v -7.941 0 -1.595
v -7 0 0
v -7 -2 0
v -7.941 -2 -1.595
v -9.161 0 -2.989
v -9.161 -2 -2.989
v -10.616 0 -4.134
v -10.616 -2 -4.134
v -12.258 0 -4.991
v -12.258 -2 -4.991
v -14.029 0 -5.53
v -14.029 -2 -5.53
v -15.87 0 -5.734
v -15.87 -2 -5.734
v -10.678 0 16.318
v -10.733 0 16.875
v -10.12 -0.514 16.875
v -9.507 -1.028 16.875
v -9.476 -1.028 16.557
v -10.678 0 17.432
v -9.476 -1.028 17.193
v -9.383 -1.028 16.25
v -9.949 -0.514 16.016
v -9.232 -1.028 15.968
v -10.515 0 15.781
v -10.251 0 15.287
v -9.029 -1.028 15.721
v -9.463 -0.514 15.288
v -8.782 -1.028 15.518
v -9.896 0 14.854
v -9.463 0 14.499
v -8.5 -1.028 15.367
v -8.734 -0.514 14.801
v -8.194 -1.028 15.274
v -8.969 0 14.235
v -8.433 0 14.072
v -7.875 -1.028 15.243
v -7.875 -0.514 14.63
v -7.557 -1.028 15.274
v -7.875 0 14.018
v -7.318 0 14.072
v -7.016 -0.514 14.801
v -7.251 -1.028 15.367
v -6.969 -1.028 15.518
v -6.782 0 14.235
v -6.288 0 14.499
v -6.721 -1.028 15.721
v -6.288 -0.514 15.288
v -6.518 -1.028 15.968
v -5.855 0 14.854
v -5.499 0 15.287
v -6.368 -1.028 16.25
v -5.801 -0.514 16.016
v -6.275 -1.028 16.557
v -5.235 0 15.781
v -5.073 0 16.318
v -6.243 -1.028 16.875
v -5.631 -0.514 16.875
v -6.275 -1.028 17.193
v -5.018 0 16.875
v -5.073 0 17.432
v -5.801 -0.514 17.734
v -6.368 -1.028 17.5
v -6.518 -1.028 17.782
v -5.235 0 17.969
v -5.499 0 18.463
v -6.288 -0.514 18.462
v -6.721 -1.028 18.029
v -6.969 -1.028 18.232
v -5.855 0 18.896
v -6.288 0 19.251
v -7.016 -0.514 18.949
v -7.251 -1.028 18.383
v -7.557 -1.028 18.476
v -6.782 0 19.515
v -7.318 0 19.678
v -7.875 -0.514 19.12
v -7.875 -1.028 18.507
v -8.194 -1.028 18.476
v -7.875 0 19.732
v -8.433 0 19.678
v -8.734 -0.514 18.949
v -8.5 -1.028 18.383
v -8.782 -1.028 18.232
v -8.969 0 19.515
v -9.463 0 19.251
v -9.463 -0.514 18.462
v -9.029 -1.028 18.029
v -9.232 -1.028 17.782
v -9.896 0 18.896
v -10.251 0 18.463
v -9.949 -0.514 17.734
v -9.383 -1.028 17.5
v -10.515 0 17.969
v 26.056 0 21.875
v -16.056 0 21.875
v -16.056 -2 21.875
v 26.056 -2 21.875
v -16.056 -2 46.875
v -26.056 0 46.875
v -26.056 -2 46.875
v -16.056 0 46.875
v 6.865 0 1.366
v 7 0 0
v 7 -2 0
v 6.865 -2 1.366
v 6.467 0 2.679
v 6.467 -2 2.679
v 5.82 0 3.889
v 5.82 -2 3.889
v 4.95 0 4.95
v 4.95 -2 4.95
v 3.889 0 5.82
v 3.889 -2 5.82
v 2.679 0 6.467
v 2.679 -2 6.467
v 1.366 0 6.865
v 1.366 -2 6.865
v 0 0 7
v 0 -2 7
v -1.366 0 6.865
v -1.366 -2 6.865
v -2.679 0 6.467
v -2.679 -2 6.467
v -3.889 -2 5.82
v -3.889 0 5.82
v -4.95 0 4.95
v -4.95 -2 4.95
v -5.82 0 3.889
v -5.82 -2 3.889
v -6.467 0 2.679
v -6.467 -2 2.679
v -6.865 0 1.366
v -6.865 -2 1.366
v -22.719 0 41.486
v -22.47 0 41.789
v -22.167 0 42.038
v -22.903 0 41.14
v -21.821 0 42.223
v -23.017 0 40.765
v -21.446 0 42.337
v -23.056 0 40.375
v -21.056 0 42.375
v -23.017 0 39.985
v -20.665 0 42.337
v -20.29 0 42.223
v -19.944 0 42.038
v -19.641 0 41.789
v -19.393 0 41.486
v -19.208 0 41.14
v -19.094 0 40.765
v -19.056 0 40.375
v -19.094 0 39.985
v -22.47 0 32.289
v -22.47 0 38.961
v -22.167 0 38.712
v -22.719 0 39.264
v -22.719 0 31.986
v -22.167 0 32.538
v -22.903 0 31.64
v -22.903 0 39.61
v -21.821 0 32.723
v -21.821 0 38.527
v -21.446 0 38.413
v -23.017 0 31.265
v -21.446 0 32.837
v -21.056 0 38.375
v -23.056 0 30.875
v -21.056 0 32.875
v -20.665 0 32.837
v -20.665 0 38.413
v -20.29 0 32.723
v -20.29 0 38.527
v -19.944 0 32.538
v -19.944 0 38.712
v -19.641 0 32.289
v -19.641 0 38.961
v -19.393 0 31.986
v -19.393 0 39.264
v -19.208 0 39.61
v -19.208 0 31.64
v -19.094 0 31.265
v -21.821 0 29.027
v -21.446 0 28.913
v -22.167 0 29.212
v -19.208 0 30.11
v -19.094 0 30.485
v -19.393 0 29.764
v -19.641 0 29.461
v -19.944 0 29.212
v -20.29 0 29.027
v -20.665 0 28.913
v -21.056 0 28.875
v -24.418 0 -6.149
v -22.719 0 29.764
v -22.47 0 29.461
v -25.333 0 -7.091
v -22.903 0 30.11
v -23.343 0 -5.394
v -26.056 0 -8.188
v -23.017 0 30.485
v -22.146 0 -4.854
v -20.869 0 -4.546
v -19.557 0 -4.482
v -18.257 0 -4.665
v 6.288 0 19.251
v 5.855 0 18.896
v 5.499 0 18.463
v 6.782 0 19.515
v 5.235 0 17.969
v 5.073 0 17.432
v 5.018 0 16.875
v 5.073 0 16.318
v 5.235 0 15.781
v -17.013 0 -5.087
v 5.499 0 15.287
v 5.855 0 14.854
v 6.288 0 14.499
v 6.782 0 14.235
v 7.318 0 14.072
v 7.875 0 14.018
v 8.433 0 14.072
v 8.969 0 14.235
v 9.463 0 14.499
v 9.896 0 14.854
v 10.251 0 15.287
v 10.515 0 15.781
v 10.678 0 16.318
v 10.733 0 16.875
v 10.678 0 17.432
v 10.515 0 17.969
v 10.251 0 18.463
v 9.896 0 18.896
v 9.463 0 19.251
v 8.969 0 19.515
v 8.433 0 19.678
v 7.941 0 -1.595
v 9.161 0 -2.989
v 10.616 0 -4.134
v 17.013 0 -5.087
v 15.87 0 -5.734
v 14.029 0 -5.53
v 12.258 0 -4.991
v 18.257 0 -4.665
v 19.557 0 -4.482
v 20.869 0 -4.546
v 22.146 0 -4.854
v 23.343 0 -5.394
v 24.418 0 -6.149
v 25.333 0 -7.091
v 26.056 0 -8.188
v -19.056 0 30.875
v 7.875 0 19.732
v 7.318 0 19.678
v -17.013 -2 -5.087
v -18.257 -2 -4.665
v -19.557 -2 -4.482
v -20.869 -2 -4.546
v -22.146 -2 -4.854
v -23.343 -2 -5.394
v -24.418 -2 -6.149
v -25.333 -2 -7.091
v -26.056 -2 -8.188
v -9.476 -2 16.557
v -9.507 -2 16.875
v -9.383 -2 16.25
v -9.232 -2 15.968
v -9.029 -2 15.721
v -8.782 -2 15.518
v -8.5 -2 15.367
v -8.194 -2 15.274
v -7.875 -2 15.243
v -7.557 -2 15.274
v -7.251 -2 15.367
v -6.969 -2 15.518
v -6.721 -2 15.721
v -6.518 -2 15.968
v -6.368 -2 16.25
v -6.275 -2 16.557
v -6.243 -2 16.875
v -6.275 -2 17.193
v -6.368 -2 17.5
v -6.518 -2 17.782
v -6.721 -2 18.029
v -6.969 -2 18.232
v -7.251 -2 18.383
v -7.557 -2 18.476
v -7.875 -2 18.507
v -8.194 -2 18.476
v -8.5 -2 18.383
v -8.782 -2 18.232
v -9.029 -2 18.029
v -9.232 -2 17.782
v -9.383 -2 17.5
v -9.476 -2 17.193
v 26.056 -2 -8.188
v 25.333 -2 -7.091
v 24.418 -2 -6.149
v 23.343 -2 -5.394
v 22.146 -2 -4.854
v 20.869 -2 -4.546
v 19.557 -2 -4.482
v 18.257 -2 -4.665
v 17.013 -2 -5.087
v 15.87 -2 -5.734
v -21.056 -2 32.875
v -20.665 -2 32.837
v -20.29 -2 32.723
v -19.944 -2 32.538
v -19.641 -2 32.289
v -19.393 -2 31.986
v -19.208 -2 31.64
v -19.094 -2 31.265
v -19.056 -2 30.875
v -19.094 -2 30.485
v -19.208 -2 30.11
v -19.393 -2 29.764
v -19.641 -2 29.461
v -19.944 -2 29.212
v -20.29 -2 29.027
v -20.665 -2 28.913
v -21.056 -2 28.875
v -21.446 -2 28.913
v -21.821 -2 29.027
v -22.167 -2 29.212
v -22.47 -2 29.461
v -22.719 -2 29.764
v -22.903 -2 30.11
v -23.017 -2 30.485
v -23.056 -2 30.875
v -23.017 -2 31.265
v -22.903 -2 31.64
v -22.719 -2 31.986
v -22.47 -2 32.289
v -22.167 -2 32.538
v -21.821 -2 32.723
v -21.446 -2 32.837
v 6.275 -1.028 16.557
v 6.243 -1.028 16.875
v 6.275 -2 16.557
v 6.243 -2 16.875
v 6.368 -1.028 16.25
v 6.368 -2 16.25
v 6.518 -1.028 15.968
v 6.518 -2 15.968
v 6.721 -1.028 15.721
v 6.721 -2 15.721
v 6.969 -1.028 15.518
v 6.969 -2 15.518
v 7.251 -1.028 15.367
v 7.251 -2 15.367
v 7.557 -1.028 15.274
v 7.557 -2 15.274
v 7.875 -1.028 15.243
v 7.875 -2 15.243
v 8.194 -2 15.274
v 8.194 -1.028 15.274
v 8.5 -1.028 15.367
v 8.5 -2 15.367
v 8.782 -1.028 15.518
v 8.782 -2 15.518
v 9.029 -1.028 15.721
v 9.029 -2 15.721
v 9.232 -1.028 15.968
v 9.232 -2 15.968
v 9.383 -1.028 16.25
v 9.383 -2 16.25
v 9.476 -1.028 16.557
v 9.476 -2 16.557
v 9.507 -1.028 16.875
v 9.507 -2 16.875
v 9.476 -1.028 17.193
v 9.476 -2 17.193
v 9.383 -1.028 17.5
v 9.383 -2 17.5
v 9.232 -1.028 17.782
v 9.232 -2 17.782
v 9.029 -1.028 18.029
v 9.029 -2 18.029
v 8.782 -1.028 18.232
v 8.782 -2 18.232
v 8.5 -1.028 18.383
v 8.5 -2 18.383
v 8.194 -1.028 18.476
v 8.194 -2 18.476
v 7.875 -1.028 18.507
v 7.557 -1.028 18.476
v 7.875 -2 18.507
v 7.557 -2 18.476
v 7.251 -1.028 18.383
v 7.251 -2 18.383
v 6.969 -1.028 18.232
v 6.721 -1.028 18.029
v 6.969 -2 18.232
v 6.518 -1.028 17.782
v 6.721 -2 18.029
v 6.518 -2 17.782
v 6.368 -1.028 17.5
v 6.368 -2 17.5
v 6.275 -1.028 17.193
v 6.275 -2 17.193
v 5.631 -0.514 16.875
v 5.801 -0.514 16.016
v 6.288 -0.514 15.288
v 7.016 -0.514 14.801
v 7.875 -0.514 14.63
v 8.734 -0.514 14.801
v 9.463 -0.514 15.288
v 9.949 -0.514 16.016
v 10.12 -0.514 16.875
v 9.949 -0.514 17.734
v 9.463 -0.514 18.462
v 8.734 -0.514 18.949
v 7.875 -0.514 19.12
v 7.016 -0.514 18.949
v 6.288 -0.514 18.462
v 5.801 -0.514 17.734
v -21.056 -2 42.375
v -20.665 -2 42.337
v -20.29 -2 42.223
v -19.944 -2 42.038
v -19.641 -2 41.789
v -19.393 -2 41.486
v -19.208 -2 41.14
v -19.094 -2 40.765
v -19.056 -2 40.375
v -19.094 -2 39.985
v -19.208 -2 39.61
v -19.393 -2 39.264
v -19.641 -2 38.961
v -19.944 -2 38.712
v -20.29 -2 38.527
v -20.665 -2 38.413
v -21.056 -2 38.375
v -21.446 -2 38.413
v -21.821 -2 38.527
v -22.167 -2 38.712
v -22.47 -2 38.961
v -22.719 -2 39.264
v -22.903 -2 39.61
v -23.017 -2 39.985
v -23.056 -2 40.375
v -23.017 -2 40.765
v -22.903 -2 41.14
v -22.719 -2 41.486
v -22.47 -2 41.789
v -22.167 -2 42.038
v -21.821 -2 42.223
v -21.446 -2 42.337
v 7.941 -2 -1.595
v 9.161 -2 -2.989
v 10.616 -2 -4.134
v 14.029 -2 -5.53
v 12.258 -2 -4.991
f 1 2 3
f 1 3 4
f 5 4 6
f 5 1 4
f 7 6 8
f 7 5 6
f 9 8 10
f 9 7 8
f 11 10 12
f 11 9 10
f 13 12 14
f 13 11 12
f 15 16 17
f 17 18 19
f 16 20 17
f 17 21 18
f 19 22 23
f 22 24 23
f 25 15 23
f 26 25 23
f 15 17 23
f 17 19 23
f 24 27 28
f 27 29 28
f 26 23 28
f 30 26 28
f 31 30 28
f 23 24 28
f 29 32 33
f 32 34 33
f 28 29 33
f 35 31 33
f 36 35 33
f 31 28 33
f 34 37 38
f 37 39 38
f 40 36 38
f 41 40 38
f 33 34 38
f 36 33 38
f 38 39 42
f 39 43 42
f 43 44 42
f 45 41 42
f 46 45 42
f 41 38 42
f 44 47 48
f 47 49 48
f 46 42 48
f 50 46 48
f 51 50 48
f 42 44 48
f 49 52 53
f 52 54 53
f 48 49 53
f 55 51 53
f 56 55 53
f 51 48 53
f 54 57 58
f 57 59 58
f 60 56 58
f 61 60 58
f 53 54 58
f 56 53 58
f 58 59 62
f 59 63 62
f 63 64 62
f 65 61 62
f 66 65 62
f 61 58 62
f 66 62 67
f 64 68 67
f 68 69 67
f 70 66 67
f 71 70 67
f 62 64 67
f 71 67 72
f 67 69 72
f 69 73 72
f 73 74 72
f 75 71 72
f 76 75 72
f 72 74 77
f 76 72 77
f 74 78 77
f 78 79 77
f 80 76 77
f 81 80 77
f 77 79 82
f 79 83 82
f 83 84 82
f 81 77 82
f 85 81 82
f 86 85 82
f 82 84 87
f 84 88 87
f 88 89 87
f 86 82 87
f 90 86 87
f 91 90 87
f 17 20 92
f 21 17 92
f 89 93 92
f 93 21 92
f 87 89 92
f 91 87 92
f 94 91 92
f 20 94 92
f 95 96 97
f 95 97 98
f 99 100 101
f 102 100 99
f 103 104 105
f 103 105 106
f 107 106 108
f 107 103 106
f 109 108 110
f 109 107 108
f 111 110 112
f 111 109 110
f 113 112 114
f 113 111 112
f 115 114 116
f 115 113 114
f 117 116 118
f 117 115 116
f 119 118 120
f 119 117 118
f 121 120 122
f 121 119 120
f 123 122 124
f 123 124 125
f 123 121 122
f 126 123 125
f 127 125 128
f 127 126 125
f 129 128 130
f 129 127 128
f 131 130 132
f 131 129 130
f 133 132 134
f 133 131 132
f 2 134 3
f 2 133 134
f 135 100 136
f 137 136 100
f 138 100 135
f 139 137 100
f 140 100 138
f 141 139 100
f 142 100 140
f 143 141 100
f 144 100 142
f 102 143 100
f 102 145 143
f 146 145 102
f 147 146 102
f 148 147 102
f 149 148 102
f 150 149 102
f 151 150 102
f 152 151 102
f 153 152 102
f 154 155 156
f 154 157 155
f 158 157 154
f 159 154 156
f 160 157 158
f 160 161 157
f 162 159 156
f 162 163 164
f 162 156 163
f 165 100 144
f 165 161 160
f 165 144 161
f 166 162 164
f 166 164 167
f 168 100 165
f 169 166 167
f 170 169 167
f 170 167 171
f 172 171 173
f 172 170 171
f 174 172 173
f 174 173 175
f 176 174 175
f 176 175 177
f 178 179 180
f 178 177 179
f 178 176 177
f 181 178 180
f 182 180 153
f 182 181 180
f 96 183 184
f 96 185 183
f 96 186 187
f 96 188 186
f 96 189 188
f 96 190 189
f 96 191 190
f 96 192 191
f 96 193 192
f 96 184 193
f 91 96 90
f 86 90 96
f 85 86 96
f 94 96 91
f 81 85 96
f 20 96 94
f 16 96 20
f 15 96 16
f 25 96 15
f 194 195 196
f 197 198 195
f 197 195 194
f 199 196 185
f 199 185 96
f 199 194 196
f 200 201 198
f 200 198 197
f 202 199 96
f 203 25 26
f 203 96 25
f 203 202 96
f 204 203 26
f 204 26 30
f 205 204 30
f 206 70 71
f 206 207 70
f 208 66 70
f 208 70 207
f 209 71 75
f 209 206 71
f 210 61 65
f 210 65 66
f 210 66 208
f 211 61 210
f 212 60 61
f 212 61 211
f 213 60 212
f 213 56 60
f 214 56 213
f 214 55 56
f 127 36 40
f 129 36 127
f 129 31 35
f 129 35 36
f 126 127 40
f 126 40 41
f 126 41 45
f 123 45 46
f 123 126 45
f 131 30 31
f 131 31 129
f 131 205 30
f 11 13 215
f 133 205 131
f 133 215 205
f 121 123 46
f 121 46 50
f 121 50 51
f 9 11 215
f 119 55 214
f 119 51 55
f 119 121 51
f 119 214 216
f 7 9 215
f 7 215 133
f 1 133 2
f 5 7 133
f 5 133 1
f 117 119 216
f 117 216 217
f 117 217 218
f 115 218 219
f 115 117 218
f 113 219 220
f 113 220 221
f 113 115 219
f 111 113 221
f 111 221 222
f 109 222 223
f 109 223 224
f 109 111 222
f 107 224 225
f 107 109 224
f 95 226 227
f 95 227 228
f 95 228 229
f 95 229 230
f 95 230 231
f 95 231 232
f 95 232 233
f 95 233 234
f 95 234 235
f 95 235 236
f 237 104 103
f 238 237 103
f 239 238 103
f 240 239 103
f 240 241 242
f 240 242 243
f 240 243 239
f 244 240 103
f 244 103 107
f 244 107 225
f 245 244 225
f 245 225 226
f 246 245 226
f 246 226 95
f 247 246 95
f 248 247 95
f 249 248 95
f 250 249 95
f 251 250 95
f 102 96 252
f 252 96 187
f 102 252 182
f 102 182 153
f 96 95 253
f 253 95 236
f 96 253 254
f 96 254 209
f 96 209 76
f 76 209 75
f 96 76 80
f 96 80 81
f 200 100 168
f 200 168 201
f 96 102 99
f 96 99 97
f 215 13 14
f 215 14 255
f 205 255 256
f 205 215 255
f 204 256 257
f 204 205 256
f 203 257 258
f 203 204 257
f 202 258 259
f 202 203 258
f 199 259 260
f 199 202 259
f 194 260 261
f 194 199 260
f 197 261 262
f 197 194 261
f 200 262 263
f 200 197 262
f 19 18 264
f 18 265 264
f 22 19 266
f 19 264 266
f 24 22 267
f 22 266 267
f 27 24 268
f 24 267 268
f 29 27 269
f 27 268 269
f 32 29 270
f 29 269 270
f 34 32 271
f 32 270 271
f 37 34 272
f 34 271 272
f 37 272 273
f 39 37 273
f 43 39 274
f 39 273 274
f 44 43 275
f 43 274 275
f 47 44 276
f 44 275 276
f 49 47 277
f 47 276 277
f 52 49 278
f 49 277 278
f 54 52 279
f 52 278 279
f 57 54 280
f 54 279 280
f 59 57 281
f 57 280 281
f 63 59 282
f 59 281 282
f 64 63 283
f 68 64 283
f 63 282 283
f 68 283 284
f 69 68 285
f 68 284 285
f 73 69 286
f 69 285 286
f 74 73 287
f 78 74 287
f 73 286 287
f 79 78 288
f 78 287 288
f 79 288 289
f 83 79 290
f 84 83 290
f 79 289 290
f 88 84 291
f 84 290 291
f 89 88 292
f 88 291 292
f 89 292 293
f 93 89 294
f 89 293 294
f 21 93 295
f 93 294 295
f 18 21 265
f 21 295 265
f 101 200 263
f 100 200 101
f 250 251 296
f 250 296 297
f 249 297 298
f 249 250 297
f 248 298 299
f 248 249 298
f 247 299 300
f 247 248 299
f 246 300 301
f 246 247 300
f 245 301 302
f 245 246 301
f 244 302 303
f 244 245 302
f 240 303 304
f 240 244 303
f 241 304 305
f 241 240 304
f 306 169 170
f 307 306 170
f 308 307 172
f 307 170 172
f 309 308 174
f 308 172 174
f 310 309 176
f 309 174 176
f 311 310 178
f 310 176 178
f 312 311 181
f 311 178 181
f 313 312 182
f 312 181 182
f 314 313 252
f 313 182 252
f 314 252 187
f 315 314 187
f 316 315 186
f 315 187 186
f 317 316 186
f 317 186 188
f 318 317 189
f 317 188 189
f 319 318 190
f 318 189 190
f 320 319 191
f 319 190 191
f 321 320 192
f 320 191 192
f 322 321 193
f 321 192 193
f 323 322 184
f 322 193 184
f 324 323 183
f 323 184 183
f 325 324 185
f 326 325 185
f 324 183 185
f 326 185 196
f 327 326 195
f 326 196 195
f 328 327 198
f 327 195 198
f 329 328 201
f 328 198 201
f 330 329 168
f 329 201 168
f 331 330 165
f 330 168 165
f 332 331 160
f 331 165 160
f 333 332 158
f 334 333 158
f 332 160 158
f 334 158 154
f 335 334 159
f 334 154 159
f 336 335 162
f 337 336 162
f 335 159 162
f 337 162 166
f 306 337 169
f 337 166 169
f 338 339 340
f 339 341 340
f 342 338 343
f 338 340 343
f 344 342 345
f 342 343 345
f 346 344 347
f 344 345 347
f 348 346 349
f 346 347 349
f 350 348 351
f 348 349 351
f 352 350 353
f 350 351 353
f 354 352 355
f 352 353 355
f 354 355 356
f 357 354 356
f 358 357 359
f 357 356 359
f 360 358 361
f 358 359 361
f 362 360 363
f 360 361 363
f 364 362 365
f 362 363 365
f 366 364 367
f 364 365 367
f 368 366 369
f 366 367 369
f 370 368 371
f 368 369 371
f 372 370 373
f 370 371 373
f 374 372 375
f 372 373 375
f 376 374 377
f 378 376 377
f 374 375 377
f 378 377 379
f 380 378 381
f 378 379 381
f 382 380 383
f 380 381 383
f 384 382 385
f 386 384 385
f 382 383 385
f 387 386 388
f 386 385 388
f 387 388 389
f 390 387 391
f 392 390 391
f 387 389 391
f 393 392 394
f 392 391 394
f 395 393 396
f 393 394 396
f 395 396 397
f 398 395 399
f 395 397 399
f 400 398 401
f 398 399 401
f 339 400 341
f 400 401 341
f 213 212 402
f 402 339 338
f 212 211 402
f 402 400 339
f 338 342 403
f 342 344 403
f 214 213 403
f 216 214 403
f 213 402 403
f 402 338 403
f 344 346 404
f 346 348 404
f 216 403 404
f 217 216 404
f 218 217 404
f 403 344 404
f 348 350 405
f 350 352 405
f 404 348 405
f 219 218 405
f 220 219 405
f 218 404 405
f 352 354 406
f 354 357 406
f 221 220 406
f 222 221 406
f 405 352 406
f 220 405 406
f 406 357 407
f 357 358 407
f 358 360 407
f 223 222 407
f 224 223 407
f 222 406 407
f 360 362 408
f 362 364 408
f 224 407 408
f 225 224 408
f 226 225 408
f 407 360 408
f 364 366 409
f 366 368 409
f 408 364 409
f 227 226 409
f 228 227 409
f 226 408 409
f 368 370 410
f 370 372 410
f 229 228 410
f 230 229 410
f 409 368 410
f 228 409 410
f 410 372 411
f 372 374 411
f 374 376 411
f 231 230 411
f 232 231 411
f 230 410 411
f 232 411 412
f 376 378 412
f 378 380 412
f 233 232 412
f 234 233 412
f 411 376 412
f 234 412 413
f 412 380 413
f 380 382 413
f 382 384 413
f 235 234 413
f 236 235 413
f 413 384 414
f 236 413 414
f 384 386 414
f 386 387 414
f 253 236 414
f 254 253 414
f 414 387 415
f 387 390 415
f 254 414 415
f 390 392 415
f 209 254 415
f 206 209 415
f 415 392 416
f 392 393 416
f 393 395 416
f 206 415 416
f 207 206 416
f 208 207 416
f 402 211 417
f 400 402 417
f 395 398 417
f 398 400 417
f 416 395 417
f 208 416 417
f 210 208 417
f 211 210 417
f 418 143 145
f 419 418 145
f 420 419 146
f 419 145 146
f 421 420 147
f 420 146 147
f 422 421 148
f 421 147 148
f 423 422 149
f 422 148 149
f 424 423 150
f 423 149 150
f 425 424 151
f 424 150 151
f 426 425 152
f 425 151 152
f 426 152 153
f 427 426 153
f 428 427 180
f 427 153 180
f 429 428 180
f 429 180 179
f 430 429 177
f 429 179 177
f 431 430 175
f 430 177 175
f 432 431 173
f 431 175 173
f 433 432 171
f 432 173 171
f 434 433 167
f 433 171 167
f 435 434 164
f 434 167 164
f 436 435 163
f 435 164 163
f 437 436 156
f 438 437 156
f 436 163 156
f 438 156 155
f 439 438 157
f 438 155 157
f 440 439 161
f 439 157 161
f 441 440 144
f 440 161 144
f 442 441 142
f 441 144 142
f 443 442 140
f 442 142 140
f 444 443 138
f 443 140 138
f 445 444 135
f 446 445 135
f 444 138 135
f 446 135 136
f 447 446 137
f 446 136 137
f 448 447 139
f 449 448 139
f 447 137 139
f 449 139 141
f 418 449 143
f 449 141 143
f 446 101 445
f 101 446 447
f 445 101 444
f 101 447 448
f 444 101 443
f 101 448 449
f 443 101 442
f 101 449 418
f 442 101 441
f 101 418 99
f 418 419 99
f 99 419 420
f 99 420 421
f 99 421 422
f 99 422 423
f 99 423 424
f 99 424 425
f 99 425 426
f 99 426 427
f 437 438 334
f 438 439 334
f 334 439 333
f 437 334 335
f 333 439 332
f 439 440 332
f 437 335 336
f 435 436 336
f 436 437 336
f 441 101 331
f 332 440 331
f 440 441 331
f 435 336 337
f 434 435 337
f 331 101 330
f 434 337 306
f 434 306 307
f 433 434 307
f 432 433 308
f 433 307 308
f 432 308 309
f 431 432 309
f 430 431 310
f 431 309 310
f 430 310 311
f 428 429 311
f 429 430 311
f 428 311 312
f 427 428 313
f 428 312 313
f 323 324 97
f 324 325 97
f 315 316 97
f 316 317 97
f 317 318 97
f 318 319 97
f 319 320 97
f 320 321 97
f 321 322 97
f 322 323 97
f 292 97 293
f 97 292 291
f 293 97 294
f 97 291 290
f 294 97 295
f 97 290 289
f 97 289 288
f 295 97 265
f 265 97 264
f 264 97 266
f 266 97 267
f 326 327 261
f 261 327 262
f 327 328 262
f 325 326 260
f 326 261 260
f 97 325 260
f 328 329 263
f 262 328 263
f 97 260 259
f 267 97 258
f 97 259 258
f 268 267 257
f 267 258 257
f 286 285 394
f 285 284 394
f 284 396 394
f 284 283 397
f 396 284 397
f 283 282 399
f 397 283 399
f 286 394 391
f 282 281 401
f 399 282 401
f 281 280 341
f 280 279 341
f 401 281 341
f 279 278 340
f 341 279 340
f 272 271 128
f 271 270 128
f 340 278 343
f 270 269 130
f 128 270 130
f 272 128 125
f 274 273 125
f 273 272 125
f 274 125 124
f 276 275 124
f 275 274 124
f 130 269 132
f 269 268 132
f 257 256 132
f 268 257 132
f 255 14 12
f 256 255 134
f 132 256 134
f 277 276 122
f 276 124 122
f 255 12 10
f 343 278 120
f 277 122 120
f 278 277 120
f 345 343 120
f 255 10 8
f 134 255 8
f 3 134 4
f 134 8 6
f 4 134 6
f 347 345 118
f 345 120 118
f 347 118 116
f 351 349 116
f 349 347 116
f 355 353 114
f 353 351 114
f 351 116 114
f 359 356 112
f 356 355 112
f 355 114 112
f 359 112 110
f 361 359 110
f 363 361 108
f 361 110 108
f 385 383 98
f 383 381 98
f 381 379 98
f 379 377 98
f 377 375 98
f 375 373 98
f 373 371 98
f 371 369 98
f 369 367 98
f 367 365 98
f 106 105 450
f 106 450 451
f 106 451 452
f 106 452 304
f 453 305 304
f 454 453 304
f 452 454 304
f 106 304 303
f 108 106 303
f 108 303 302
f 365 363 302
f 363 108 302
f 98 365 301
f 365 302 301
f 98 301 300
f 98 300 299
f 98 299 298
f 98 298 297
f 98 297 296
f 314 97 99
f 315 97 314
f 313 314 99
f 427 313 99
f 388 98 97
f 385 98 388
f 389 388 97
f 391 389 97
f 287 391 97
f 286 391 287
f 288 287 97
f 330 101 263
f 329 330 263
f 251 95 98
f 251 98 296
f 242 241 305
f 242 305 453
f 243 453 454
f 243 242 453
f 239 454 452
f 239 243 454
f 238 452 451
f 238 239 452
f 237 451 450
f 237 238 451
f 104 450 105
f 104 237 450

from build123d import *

# Parameters (mm, degrees)
BASE_FLANGE1_DEPTH                                = 2
SKETCH7_R                                         = 2
CUT_EXTRUDE1_DEPTH                                = 2
CSK_FOR_4_FLAT_HEAD_MACHINE_SCREW_100_D           = 3.2639
CSK_FOR_4_FLAT_HEAD_MACHINE_SCREW_100_DEPTH       = 2
CSK_FOR_4_FLAT_HEAD_MACHINE_SCREW_100_CSINK_D     = 5.715
CSK_FOR_4_FLAT_HEAD_MACHINE_SCREW_100_CSINK_ANGLE = 100
CSK_FOR_4_FLAT_HEAD_MACHINE_SCREW_100_TIP         = 0.980574487


# Sheet-metal steps are written as plain solids
with BuildPart() as part:
    # Sketch2 → Base-Flange1 (new body)
    with BuildSketch(Plane(origin=(0, 0, 0), x_dir=(1, 0, 0), z_dir=(0, 1, 0))):
        with BuildLine():
            Line((-26.055569119, -21.875), (-26.055569119, -46.875))
            Line((-26.055569119, -46.875), (-16.055569119, -46.875))
            Line((-16.055569119, -46.875), (-16.055569119, -21.875))
            Line((-16.055569119, -21.875), (26.055569119, -21.875))
            Line((26.055569119, -21.875), (26.055569119, 8.188046441))
            ThreePointArc((26.055569119, 8.188046441), (21.514872246, 4.669726518), (15.870079226, 5.73406431))
            ThreePointArc((15.870079226, 5.73406431), (10.616247764, 4.133629141), (7, 0))
            ThreePointArc((7, 0), (0, -7), (-7, 0))
            ThreePointArc((-7, 0), (-10.616247764, 4.133629141), (-15.870079226, 5.73406431))
            ThreePointArc((-15.870079226, 5.73406431), (-21.514872246, 4.669726518), (-26.055569119, 8.188046441))
            Line((-26.055569119, 8.188046441), (-26.055569119, -21.875))
        make_face()
    extrude(amount=-BASE_FLANGE1_DEPTH)

    # Sketch7 → Cut-Extrude1 (cut)
    with BuildSketch(Plane(origin=(0, 0, 0), x_dir=(1, 0, 0), z_dir=(0, 1, 0))):
        with Locations(Location((-21.055569119, -40.375, 0), (0, 0, 270))):
            Circle(SKETCH7_R)
        with Locations(Location((-21.055569119, -30.875, 0), (0, 0, 270))):
            Circle(SKETCH7_R)
    extrude(amount=-CUT_EXTRUDE1_DEPTH, mode=Mode.SUBTRACT)

    # CSK for #4 Flat Head Machine Screw (100)1
    with Locations(Plane(origin=(0, 0, 0), x_dir=(1, 0, 0), z_dir=(0, 1, 0))):
        with Locations((-7.875283017, -16.875), (7.875283017, -16.875)):
            CounterSinkHole(CSK_FOR_4_FLAT_HEAD_MACHINE_SCREW_100_D / 2, CSK_FOR_4_FLAT_HEAD_MACHINE_SCREW_100_CSINK_D / 2, depth=CSK_FOR_4_FLAT_HEAD_MACHINE_SCREW_100_DEPTH, counter_sink_angle=CSK_FOR_4_FLAT_HEAD_MACHINE_SCREW_100_CSINK_ANGLE)
            with Locations((0, 0, -(CSK_FOR_4_FLAT_HEAD_MACHINE_SCREW_100_DEPTH + CSK_FOR_4_FLAT_HEAD_MACHINE_SCREW_100_TIP / 2))):  # 118° drill point
                Cone(0, CSK_FOR_4_FLAT_HEAD_MACHINE_SCREW_100_D / 2, CSK_FOR_4_FLAT_HEAD_MACHINE_SCREW_100_TIP, mode=Mode.SUBTRACT)


solid = part.part
